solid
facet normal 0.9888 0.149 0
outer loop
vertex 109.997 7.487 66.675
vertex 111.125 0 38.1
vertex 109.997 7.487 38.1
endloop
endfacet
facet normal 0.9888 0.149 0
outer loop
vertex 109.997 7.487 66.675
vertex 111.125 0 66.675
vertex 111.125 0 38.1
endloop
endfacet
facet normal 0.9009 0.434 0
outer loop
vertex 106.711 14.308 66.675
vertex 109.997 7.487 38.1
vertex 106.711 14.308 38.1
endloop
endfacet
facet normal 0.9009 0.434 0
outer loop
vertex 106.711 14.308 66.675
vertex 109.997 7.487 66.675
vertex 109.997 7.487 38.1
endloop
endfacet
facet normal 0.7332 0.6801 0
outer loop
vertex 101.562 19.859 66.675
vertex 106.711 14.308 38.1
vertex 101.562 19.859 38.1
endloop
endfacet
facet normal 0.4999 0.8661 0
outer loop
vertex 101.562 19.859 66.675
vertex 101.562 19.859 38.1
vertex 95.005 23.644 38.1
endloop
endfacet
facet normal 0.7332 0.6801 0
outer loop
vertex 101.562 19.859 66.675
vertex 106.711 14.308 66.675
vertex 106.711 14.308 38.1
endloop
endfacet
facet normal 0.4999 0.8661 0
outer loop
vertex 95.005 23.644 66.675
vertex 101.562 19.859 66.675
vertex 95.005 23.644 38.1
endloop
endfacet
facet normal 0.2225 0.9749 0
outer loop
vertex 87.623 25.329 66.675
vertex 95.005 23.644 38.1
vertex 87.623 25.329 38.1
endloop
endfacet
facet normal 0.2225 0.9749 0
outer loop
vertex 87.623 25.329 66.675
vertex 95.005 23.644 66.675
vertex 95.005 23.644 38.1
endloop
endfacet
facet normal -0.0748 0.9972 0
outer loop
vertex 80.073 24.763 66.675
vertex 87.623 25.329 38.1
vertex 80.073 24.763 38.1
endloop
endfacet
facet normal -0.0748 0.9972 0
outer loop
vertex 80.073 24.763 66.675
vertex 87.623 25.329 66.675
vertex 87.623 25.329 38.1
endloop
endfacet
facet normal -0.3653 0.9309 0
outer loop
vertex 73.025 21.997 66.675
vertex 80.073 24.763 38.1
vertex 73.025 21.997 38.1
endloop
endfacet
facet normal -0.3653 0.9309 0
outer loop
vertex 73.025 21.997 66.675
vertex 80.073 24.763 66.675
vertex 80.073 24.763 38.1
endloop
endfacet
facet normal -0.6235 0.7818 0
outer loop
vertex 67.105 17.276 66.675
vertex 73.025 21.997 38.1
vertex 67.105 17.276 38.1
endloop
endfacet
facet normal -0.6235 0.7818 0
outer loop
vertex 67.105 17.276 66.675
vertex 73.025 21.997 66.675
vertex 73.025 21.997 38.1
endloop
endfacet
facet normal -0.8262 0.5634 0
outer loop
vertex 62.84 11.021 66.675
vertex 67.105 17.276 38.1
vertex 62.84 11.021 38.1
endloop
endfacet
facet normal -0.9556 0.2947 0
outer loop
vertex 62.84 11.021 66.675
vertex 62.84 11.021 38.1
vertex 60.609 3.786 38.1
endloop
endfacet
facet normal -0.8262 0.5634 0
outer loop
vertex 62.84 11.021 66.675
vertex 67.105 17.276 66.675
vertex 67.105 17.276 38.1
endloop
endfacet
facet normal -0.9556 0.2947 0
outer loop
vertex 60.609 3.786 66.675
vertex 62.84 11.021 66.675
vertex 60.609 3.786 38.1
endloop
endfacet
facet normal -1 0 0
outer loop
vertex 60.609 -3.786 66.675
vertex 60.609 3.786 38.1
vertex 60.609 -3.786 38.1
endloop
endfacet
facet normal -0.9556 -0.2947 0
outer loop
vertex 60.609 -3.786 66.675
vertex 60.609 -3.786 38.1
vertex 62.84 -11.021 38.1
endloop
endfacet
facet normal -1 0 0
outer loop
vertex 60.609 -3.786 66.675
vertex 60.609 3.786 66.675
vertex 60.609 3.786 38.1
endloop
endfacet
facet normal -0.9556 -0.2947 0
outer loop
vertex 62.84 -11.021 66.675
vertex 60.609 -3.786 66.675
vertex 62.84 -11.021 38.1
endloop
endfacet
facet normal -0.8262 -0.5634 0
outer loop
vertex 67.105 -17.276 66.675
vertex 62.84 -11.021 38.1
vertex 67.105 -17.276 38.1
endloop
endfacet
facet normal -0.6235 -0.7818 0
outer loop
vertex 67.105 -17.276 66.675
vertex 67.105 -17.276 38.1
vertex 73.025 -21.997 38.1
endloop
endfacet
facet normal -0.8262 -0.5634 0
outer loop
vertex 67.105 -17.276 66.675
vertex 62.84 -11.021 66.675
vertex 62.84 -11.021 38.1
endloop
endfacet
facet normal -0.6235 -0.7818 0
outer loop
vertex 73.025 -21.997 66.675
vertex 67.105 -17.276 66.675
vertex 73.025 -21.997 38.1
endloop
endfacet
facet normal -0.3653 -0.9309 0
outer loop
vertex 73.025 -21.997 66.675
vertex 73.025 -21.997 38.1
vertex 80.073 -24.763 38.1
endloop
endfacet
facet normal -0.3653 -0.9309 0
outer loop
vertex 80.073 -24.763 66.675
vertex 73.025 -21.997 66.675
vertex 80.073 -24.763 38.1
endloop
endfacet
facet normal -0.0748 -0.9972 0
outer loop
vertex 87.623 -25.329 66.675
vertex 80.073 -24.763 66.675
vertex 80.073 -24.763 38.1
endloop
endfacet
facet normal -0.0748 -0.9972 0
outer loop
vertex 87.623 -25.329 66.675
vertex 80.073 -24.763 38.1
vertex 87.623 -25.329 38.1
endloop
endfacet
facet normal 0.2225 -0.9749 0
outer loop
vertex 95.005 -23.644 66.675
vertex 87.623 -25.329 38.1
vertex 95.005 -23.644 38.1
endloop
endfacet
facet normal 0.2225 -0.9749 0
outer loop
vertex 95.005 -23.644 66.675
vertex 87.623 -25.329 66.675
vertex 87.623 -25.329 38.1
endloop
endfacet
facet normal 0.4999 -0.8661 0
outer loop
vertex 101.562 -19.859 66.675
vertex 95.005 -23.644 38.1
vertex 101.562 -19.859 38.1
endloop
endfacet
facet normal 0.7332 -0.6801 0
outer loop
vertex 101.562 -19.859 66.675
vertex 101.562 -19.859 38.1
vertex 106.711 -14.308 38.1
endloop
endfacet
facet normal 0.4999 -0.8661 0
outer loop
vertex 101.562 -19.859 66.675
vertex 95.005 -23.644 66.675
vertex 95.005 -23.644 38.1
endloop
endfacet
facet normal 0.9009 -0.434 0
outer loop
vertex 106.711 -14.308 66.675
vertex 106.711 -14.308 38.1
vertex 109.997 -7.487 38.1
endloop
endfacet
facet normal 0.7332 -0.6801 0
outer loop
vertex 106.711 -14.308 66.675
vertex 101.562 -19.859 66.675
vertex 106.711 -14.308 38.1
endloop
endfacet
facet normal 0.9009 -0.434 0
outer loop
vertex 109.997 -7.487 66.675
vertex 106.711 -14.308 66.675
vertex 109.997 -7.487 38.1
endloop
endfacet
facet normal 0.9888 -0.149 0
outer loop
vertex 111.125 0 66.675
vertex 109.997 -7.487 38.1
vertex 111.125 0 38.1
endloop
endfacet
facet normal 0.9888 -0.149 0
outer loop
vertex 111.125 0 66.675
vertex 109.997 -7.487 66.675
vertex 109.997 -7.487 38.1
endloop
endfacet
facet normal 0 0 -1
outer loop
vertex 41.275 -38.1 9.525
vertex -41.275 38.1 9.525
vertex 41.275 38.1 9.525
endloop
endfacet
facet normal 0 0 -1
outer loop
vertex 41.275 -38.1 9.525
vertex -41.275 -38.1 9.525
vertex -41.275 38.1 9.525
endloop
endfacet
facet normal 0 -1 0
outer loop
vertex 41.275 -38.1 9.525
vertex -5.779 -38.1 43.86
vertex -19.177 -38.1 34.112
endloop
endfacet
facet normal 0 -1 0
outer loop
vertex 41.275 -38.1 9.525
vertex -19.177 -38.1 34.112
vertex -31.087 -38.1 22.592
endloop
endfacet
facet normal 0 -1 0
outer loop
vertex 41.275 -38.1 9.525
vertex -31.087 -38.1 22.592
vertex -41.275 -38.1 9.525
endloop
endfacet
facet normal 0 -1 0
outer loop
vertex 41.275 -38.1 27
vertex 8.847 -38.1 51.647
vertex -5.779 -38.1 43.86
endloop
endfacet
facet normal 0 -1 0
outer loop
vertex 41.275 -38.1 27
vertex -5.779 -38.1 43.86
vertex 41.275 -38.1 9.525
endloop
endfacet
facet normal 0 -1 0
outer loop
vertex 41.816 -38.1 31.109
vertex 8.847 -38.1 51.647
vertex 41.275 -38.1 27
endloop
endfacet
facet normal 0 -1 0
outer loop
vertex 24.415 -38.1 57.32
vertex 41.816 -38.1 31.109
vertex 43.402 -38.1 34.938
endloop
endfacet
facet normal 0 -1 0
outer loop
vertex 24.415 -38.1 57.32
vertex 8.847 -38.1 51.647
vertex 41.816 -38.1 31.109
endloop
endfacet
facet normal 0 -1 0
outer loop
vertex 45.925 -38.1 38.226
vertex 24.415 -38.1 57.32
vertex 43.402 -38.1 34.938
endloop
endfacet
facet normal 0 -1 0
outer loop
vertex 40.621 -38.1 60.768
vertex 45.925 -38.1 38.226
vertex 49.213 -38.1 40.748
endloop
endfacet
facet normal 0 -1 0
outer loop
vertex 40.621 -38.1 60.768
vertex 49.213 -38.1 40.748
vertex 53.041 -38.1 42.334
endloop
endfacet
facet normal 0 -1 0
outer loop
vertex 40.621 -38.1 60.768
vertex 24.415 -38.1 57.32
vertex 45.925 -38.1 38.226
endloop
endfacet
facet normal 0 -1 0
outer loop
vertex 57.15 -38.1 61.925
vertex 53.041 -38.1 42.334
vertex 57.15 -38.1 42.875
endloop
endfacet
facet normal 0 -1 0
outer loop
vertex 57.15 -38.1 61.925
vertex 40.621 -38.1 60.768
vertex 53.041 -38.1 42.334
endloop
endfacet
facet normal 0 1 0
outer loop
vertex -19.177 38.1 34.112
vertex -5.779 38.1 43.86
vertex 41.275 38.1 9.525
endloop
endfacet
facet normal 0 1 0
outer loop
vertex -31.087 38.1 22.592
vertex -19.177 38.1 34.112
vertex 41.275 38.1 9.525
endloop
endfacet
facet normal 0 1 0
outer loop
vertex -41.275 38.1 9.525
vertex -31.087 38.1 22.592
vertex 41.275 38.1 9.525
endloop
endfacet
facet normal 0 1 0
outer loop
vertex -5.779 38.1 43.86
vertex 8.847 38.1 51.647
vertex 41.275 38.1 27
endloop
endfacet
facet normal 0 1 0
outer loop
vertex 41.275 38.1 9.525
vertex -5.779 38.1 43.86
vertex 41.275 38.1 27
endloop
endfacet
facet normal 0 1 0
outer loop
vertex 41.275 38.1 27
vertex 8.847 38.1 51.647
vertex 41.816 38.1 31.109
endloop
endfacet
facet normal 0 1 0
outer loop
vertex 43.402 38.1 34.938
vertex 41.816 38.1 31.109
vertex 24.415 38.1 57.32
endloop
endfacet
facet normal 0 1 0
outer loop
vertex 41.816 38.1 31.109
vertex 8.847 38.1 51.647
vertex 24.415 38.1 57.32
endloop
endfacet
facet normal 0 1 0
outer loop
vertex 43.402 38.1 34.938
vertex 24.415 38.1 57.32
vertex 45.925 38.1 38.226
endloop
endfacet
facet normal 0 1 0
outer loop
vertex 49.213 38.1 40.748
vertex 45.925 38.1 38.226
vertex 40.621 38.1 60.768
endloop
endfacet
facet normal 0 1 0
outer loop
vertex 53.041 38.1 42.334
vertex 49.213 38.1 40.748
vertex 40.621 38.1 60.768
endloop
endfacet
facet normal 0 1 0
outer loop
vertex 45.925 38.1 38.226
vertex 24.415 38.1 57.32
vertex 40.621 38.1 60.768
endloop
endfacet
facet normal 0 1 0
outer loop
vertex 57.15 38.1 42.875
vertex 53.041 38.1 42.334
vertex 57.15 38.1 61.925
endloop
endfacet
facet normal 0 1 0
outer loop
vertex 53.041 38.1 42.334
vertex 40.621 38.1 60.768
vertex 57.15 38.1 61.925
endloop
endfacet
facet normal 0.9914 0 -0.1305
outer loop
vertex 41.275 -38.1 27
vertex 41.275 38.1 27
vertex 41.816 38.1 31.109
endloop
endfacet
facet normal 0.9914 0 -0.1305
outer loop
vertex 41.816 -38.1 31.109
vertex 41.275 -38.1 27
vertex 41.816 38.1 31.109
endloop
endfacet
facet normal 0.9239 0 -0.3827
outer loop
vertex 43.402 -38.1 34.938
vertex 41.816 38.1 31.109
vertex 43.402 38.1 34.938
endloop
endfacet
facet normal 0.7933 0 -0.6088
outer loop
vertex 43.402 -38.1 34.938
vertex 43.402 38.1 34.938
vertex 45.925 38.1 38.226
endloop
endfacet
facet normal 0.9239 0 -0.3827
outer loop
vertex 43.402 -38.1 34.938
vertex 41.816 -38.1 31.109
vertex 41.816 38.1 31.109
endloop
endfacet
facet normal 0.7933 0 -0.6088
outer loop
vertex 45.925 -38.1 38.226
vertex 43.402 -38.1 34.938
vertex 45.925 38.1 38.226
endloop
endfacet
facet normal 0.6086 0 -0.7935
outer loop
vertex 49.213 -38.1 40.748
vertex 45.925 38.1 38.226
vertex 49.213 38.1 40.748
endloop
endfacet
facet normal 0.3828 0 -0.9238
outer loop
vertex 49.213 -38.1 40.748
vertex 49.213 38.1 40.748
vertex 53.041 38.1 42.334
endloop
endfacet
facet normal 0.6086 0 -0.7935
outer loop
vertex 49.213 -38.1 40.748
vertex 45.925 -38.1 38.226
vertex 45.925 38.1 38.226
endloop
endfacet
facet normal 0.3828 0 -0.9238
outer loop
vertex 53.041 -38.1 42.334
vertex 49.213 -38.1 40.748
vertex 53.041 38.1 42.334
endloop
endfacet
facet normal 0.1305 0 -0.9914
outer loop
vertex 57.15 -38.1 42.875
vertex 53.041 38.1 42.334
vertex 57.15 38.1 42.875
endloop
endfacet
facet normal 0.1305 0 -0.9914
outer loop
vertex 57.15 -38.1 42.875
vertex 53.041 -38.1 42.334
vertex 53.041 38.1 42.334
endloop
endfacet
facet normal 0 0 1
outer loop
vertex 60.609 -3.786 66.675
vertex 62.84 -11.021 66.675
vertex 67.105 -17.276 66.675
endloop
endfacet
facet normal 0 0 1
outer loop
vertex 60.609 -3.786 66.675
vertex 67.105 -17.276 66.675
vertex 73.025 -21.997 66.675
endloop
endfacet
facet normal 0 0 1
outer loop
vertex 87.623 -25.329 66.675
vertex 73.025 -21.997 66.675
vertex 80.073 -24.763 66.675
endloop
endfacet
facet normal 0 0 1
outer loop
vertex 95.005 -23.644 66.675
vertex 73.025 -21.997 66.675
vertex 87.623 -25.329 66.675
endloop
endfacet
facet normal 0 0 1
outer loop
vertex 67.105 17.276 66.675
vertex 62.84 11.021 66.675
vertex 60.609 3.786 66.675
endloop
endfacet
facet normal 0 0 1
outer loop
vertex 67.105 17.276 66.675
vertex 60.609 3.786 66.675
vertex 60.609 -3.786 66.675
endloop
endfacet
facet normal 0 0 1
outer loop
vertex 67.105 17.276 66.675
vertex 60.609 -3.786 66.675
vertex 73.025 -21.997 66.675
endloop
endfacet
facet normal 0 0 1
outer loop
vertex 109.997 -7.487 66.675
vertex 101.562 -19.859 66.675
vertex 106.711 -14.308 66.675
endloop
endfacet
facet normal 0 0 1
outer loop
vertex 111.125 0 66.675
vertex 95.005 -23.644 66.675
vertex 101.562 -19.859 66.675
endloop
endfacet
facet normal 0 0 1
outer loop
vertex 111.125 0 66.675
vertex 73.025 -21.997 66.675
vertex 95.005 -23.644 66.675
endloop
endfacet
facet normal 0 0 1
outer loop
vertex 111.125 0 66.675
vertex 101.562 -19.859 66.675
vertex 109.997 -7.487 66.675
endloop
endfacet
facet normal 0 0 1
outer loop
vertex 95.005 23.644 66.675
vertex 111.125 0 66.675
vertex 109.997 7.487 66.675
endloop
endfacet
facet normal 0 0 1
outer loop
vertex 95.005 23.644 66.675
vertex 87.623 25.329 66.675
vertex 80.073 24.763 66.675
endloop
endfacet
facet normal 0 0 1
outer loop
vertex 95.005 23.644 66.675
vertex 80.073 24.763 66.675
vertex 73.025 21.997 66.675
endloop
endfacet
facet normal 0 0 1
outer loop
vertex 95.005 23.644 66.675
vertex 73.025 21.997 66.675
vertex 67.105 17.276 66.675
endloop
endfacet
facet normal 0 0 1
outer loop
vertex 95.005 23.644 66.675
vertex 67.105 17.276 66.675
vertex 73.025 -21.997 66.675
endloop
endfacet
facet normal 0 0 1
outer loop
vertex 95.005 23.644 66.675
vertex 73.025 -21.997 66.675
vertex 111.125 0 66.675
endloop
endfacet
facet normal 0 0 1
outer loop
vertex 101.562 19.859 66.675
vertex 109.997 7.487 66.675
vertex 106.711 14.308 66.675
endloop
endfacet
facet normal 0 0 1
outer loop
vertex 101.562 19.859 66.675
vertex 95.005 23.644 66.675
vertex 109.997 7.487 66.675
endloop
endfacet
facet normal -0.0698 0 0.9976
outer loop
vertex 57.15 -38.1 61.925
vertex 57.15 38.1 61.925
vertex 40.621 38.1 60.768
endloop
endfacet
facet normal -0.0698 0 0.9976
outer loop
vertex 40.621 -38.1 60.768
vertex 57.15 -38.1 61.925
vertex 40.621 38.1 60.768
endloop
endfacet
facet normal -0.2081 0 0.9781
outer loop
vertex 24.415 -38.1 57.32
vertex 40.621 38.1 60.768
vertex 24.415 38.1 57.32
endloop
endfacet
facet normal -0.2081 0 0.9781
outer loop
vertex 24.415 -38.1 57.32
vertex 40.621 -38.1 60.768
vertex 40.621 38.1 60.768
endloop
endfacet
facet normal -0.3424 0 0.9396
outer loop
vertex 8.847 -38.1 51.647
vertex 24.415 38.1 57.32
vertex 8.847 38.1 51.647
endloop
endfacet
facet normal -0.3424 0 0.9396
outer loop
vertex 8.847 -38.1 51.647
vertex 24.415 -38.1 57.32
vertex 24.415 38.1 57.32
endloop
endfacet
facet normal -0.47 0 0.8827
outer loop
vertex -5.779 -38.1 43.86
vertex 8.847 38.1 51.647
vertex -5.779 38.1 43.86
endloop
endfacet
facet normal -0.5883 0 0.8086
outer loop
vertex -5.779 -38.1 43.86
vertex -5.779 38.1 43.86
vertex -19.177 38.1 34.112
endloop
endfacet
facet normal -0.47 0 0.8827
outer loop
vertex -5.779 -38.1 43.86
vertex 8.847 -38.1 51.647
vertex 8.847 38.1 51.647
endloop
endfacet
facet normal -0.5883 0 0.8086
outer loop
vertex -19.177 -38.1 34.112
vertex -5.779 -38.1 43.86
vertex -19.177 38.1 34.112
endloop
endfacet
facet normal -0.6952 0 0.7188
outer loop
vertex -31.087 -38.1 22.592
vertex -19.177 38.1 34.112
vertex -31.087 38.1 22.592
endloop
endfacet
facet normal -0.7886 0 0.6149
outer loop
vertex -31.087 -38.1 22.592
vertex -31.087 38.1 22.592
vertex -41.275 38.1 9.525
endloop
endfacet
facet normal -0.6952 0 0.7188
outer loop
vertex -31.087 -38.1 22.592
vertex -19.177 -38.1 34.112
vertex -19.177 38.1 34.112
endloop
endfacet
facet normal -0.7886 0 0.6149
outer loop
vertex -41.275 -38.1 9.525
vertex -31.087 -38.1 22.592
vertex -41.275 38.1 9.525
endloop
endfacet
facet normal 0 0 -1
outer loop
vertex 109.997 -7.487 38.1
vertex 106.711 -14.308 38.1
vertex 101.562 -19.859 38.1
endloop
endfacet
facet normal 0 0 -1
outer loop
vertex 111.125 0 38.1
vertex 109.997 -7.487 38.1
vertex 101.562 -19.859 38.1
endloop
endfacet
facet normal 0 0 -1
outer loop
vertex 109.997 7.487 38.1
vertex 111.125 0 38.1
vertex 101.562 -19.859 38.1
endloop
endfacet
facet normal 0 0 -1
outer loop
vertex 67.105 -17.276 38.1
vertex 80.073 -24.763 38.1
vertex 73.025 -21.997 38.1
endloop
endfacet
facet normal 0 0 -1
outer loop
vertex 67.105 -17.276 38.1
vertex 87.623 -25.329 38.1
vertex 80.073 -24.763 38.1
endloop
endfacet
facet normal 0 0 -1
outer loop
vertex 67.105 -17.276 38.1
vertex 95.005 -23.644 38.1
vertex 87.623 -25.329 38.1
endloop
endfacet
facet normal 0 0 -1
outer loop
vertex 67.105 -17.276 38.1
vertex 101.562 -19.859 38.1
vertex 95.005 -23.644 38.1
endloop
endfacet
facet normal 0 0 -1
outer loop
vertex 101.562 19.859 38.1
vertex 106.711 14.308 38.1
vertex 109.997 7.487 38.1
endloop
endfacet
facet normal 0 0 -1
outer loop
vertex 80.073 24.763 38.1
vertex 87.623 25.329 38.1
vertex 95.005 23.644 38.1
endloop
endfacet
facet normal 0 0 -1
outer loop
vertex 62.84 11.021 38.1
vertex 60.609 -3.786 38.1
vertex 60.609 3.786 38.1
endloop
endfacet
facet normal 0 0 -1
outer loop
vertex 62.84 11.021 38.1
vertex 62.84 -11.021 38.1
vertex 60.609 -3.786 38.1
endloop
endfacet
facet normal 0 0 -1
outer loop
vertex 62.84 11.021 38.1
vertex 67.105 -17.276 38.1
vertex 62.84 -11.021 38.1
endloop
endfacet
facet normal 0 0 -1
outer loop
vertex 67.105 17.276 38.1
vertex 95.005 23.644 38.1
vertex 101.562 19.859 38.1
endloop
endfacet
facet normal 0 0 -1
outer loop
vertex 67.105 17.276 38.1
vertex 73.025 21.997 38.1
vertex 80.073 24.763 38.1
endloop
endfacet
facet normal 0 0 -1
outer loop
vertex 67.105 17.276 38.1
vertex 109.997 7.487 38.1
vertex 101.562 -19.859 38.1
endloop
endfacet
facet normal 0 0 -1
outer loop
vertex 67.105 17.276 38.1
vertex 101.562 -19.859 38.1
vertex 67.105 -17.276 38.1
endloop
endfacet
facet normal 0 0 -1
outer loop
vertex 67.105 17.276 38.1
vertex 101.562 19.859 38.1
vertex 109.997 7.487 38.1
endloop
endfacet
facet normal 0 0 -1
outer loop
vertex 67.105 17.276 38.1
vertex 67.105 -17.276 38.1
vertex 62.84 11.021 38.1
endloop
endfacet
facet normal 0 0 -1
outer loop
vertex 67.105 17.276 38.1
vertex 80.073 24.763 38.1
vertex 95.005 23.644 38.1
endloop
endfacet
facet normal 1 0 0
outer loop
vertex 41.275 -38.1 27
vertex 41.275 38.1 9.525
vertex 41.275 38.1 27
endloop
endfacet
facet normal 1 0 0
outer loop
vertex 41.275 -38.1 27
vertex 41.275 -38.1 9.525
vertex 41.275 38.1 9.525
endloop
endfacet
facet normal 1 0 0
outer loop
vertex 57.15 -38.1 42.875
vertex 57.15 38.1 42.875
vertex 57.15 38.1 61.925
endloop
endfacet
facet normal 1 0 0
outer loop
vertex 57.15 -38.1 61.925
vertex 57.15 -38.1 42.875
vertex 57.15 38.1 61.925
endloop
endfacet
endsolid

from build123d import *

# Parameters (mm, degrees)
F2_DEPTH = 38.1


# Not quite as in the source:
# - the program builds the solid bodies; features that only make, move or delete a surface that nothing else refers to are left out


with BuildPart() as f2:
    # F0 (on Front) → F2 (new body, symmetric)
    with BuildSketch(Plane.XZ):
        with BuildLine():
            Line((22.225, 9.525), (41.275, 9.525))
            Line((41.275, 9.525), (41.275, 27.0002))
            ThreePointArc((41.275, 27.0002), (45.9246798487, 38.2255201513), (57.15, 42.8752))
            Line((57.15, 42.8752), (57.15, 61.9252))
            ThreePointArc((57.15, 61.9252), (32.4542956671, 51.6959043329), (22.225, 27.0002))
            Line((22.225, 27.0002), (22.225, 9.525))
        make_face()
        with BuildLine():
            ThreePointArc((57.15, 61.9252), (1.3977319182, 48.0089590969), (-41.275, 9.525))
            Line((-41.275, 9.525), (22.225, 9.525))
            Line((22.225, 9.525), (22.225, 27.0002))
            ThreePointArc((22.225, 27.0002), (32.4542956671, 51.6959043329), (57.15, 61.9252))
        make_face()
    extrude(amount=F2_DEPTH, both=True)


with BuildPart() as f3:
    # F0 (on Front) → F3 (revolve)
    with BuildSketch(Plane.XZ):
        Polygon((85.725, 66.675), (85.725, 61.9252), (85.725, 52.3875), (85.725, 42.8752), (85.725, 38.1), (111.125, 38.1), (111.125, 66.675), align=None)
    revolve(axis=Axis((85.725, 0, 50.0126), (0, 0, 1)))


solid = Compound([f2.part, f3.part])
